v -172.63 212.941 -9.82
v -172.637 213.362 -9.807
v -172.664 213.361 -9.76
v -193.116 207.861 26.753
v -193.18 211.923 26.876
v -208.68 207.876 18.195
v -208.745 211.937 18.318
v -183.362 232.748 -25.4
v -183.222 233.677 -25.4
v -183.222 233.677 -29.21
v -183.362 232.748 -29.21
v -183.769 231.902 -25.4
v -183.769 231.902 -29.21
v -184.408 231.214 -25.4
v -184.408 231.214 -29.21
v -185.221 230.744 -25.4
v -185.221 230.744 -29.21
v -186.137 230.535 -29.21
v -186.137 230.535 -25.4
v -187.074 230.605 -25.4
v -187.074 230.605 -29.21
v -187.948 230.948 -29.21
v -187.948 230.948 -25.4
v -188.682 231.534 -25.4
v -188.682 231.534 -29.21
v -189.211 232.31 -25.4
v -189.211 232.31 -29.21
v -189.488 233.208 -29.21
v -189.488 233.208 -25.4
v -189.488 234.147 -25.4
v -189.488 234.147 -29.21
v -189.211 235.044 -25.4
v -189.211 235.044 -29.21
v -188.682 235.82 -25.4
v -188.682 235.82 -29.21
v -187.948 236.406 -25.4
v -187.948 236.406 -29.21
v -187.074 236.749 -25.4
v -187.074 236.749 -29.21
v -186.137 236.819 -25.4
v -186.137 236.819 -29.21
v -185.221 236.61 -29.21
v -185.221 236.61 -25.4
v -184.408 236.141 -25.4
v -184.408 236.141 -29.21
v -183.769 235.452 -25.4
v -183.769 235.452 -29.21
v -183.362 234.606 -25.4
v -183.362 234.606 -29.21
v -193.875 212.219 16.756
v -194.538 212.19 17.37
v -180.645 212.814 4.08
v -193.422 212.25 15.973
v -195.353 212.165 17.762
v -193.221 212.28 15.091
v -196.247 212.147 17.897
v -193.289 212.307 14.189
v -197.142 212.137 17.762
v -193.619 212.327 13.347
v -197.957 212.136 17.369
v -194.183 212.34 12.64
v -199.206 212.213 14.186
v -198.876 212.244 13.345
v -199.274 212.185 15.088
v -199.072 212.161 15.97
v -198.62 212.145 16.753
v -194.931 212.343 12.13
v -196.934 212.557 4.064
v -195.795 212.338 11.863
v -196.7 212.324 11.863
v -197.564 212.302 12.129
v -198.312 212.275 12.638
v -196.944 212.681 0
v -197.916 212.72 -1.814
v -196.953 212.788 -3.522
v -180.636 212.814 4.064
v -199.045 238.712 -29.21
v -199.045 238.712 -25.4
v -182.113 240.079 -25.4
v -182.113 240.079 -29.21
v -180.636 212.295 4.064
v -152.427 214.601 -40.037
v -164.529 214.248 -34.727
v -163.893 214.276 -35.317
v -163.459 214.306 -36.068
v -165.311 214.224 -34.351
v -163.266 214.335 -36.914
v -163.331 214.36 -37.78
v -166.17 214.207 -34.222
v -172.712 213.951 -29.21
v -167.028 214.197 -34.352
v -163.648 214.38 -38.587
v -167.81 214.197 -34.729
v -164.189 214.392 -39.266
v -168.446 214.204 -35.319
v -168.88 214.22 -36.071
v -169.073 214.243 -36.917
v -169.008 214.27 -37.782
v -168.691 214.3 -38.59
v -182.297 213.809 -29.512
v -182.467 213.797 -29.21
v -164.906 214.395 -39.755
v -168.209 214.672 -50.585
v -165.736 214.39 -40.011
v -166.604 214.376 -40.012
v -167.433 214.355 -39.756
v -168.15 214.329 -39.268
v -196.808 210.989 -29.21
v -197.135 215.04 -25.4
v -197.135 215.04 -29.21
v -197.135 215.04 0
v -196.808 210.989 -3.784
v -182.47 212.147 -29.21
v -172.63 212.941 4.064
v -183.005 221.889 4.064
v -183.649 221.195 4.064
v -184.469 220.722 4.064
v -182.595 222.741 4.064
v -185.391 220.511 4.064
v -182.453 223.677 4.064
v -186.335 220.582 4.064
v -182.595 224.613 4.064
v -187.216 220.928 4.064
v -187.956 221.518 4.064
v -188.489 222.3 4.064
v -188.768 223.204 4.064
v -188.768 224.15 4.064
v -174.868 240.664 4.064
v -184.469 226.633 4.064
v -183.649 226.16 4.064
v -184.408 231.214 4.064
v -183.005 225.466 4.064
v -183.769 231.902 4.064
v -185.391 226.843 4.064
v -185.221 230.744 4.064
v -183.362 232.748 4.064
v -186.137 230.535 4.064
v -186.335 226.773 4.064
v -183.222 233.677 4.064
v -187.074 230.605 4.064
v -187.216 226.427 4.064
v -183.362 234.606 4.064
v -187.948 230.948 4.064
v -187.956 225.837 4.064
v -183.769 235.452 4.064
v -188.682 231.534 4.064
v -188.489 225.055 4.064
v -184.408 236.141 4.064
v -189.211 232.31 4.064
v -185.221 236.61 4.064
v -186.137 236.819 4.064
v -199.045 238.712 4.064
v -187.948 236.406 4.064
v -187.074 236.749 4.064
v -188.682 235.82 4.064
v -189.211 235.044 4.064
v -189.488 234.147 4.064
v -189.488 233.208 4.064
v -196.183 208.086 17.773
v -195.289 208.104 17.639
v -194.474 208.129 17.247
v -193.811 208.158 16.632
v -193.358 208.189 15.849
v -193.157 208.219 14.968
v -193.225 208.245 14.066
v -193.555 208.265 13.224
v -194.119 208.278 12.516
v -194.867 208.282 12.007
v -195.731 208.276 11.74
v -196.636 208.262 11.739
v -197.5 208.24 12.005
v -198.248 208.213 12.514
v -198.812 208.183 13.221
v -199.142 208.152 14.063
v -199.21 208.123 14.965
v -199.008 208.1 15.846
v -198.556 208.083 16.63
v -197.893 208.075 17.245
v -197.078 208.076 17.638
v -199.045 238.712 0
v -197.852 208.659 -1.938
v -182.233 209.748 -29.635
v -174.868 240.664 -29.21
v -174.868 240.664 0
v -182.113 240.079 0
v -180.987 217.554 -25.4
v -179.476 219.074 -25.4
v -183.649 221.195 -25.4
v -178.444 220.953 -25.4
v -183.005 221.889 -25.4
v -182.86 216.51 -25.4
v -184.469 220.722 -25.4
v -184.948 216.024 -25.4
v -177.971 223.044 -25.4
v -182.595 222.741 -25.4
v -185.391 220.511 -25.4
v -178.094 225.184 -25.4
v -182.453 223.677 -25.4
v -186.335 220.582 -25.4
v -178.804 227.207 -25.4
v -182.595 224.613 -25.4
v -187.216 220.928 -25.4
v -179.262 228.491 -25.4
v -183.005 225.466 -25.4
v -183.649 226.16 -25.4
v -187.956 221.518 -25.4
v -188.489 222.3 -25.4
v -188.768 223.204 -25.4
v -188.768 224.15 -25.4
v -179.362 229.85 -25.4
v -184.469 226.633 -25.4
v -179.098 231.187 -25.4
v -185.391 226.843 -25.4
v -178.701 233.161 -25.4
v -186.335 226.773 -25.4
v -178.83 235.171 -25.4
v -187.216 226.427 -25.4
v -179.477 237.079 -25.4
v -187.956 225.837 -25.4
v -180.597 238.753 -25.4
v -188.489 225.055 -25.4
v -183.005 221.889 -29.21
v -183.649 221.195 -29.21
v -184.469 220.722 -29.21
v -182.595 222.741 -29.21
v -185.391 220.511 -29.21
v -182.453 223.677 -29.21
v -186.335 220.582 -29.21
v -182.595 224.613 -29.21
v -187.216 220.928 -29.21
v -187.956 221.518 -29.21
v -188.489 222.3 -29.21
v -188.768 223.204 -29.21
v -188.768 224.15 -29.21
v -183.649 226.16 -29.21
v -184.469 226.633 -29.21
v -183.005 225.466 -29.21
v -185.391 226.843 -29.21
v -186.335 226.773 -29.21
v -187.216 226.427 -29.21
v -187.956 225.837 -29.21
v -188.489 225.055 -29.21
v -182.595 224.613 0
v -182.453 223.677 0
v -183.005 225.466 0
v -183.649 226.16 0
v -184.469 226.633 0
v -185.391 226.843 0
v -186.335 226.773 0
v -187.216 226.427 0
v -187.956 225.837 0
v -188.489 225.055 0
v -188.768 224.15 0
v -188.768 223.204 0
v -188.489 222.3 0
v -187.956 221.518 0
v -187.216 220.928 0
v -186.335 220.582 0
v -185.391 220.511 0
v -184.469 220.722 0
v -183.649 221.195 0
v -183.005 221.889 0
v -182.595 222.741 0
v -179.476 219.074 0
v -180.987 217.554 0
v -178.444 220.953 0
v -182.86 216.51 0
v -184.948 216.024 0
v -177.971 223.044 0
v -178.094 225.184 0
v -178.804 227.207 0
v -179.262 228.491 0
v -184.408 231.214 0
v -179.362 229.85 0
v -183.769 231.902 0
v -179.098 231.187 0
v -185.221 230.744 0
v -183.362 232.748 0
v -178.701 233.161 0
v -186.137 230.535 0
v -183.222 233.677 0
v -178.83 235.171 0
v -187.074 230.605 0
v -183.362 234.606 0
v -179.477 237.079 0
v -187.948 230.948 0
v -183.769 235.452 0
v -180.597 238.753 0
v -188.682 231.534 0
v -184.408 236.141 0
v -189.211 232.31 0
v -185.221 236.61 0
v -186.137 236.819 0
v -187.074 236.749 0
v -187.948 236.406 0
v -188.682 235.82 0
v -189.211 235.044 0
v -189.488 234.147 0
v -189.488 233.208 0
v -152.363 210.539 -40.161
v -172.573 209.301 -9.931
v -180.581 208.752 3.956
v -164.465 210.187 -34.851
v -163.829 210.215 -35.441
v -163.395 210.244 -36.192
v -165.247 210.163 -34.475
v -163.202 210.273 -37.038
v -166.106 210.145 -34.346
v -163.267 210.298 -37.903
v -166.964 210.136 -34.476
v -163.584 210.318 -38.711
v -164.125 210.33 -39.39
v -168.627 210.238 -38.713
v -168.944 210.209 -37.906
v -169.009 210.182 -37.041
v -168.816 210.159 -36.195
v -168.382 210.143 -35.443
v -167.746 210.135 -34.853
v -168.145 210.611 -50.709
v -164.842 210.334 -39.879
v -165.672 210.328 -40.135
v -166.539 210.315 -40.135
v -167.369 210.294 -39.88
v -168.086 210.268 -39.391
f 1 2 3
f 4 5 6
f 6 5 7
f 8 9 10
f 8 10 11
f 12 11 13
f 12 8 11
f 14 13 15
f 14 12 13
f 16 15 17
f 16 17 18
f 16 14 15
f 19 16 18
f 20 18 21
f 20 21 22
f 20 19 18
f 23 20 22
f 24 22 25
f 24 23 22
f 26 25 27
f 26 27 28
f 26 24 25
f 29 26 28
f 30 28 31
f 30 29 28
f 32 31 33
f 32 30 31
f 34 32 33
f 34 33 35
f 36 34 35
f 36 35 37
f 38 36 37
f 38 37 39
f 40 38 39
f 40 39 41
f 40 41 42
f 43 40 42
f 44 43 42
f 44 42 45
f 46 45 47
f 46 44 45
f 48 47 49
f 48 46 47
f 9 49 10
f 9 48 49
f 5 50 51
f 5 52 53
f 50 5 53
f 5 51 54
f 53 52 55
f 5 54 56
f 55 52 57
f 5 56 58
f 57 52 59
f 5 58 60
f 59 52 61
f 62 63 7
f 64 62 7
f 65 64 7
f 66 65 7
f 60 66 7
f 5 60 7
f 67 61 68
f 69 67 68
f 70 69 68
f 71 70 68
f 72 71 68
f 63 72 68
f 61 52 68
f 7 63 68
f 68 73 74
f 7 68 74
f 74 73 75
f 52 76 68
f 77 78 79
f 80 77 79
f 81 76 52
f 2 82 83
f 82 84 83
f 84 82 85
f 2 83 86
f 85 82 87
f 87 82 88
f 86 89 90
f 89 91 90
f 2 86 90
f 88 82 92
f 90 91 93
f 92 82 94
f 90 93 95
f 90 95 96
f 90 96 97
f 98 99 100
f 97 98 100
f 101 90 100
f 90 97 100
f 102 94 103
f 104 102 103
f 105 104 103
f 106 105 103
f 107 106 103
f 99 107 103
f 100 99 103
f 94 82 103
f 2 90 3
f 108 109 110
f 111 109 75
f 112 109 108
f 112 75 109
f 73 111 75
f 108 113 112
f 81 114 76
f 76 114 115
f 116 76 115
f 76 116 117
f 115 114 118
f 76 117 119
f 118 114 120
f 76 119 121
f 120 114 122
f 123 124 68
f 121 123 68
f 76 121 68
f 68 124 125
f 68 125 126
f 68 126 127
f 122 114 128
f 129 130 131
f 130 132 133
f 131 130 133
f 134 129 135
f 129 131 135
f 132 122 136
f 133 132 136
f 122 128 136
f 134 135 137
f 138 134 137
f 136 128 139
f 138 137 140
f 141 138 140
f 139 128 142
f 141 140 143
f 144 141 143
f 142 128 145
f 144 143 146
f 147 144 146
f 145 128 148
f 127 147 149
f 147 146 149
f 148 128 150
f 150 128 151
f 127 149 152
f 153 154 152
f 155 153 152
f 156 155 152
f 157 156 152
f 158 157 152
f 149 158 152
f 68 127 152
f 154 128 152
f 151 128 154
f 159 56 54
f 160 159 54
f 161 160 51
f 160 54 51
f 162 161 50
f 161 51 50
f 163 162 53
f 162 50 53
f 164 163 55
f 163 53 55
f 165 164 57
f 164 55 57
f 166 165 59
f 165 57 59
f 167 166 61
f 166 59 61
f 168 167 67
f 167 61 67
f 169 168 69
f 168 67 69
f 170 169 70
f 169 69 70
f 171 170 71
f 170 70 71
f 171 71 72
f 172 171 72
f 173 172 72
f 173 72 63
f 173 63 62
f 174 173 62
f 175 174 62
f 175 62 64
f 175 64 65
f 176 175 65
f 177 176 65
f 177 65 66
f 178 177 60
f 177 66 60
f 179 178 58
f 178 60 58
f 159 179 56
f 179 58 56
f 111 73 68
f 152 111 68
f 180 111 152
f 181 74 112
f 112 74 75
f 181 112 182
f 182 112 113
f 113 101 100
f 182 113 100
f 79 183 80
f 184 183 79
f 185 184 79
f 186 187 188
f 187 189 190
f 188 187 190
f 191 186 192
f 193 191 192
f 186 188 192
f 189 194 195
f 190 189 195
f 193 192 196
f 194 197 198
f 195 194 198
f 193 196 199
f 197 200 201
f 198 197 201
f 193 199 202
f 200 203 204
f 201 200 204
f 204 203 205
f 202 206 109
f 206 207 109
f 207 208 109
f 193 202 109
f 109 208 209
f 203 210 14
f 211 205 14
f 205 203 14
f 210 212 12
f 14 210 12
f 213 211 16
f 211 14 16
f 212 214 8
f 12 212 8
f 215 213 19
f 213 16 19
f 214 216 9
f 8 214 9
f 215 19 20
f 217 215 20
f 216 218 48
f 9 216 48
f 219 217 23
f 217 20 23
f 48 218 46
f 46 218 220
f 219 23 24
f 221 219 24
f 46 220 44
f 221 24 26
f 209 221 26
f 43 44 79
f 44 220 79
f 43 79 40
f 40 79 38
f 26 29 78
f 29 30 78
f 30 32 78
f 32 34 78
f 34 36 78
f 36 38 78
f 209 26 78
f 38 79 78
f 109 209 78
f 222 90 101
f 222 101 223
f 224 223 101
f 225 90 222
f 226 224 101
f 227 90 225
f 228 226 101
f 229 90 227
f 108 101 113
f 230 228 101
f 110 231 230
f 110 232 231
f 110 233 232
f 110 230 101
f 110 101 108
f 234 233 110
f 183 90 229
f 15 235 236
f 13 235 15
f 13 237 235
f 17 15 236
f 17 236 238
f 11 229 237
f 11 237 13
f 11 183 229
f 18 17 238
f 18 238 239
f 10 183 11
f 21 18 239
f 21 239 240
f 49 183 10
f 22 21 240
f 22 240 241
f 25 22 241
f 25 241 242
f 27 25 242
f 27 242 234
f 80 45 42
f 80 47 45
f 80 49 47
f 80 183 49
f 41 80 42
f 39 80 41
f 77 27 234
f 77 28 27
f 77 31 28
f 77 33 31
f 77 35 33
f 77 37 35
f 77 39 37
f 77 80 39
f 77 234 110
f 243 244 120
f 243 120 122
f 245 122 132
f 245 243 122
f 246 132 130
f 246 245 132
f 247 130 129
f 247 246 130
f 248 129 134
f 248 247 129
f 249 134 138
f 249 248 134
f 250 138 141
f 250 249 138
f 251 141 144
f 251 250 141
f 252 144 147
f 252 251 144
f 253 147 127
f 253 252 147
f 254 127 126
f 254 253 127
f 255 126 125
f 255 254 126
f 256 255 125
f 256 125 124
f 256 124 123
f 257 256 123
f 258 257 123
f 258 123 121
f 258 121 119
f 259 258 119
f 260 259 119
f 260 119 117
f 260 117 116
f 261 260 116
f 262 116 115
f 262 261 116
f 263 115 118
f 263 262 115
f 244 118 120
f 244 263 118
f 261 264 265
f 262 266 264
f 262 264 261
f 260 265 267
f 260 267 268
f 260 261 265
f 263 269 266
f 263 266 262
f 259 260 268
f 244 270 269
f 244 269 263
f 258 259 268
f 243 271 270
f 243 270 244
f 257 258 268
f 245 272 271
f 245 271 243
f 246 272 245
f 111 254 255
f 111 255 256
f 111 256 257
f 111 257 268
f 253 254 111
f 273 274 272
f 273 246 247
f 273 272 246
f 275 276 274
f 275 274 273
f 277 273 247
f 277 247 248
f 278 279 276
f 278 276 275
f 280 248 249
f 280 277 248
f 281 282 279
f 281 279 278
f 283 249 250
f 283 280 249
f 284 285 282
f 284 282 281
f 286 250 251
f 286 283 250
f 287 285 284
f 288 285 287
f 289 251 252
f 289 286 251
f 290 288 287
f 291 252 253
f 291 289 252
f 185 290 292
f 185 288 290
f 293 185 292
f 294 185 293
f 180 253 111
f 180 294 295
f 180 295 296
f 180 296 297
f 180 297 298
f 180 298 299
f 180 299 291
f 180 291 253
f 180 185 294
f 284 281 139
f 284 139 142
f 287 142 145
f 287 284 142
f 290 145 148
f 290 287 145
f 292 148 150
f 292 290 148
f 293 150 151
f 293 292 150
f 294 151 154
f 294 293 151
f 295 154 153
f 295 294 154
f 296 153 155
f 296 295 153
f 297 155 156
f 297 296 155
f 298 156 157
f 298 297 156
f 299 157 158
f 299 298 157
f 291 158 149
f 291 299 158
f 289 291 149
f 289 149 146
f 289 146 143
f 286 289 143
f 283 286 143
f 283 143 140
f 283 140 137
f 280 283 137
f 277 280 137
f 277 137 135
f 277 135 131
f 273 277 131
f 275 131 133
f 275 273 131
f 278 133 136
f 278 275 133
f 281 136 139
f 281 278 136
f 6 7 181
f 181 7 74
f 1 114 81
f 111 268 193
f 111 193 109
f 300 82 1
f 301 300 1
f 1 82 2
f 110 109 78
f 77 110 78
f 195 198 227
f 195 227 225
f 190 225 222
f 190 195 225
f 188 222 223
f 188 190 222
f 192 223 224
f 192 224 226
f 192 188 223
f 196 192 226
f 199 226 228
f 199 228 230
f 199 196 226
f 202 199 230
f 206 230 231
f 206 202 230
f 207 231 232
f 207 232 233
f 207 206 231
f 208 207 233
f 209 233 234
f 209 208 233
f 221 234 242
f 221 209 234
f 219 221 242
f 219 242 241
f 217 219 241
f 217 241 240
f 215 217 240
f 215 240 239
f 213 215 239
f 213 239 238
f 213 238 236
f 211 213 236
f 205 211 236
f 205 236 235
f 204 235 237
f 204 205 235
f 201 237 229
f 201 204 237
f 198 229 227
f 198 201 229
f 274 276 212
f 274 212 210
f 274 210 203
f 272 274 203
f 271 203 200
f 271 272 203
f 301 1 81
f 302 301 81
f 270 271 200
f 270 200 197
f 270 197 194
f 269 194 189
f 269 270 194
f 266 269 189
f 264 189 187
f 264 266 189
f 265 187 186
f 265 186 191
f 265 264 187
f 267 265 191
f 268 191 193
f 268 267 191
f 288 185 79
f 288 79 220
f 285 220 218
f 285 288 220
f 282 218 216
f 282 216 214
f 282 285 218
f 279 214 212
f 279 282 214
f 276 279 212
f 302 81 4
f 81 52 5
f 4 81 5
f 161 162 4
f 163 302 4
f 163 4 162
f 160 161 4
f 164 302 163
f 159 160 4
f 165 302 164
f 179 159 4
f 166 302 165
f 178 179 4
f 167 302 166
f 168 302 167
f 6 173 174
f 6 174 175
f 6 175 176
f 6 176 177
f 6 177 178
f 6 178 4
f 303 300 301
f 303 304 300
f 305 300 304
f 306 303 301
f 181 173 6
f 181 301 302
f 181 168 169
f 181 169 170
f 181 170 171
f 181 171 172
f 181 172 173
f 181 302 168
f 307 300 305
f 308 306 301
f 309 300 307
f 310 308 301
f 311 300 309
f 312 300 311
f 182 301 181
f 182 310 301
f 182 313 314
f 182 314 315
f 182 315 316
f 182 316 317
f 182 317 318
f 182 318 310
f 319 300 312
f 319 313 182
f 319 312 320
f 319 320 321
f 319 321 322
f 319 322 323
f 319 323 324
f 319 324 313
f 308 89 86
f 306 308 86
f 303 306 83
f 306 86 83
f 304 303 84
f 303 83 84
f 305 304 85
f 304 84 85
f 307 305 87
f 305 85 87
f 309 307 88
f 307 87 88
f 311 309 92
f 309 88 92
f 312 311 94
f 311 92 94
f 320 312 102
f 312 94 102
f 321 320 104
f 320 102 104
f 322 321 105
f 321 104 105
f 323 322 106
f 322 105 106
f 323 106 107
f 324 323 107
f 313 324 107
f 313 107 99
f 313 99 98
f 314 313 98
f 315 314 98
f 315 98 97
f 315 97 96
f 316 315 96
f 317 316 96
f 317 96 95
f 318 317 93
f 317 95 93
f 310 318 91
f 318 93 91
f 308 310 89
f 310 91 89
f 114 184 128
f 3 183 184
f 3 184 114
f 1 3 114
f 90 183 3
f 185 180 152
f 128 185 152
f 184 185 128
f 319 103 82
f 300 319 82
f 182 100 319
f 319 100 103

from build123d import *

# Parameters (mm, degrees)
BOSS_EXTRUDE1_DEPTH = 29.21
SKETCH2_R           = 3.175
SKETCH2_R_2         = 3.150896054
BOSS_EXTRUDE2_DEPTH = 4.064
BOSS_EXTRUDE3_START = -3.81
SKETCH3_R           = 3.150896054
SKETCH3_R_2         = 3.175
BOSS_EXTRUDE3_DEPTH = 3.81
SKETCH4_R           = 2.912114347
SKETCH4_R_2         = 3.035248441
BOSS_EXTRUDE4_DEPTH = 4.064


with BuildPart() as part:
    # Sketch1 → Boss-Extrude1 (new body)
    with BuildSketch(Plane.XY):
        with BuildLine():
            Line((-184.947787902, 216.023814704), (-197.134551999, 215.040325013))
            Line((-197.134551999, 215.040325013), (-196.807644057, 210.989494579))
            Line((-196.807644057, 210.989494579), (-172.630398999, 212.940633626))
            Line((-172.630398999, 212.940633626), (-174.867675228, 240.663504402))
            Line((-174.867675228, 240.663504402), (-182.112910704, 240.0788033))
            ThreePointArc((-182.112910704, 240.0788033), (-179.090453568, 236.146361834), (-179.097761142, 231.186594741))
            ThreePointArc((-179.097761142, 231.186594741), (-179.357825473, 229.166849047), (-178.803768808, 227.207250277))
            ThreePointArc((-178.803768808, 227.207250277), (-178.89422454, 219.977509591), (-184.947787902, 216.023814704))
        make_face()
    extrude(amount=-BOSS_EXTRUDE1_DEPTH)

    # Sketch2 → Boss-Extrude2 (add)
    with BuildSketch(Plane.XY):
        Polygon((-174.867675228, 240.663504402), (-172.630398999, 212.940633626), (-196.807644057, 210.989494579), (-199.044920286, 238.712365356), align=None)
        with Locations((-185.628460018, 223.67720197)):
            Circle(SKETCH2_R, mode=Mode.SUBTRACT)
        with Locations((-186.37244208, 233.67720197)):
            Circle(SKETCH2_R_2, mode=Mode.SUBTRACT)
    extrude(amount=BOSS_EXTRUDE2_DEPTH)

    # Sketch3 → Boss-Extrude3 (add)
    with BuildSketch(Plane(origin=(0, 0, -29.21), x_dir=(-1, 0, 0), z_dir=(0, 0, -1)).offset(BOSS_EXTRUDE3_START)):
        with BuildLine():
            Line((197.134551999, 215.040325013), (199.044920286, 238.712365356))
            Line((199.044920286, 238.712365356), (182.112910704, 240.0788033))
            ThreePointArc((182.112910704, 240.0788033), (179.090453568, 236.146361834), (179.097761142, 231.186594741))
            ThreePointArc((179.097761142, 231.186594741), (179.357825473, 229.166849047), (178.803768808, 227.207250277))
            ThreePointArc((178.803768808, 227.207250277), (178.89422454, 219.977509591), (184.947787902, 216.023814704))
            Line((184.947787902, 216.023814704), (197.134551999, 215.040325013))
        make_face()
        with Locations(Location((186.37244208, 233.67720197, 0), (0, 0, 180))):
            Circle(SKETCH3_R, mode=Mode.SUBTRACT)
        with Locations(Location((185.628460018, 223.67720197, 0), (0, 0, 180))):
            Circle(SKETCH3_R_2, mode=Mode.SUBTRACT)
    extrude(amount=BOSS_EXTRUDE3_DEPTH)

    # Sketch4 → Boss-Extrude4 (add)
    with BuildSketch(Plane(origin=(-3.401075391, 215.535251129, 6.555182159), x_dir=(0.9998756392437431, 0.015763128213975516, 0.0004794119583323757), z_dir=(-0.01577041682759283, 0.9994135267149824, 0.030395666997208134))):
        Polygon((-178.918526698, 35.997686208), (-164.828562801, 57.087586654), (-149.044849512, 46.542636431), (-169.257027987, 16.288986745), (-177.265593638, 2.391514831), (-189.802185869, -20.421476842), (-205.369032328, -11.866912445), (-194.539107817, 8.279817663), align=None)
        with Locations(Location((-162.788777802, 43.630522083, 0), (0, 0, 270))):
            Circle(SKETCH4_R, mode=Mode.SUBTRACT)
        with Locations(Location((-192.870314924, -8.404113006, 0), (0, 0, 270))):
            Circle(SKETCH4_R_2, mode=Mode.SUBTRACT)
    extrude(amount=-BOSS_EXTRUDE4_DEPTH)


solid = part.part
